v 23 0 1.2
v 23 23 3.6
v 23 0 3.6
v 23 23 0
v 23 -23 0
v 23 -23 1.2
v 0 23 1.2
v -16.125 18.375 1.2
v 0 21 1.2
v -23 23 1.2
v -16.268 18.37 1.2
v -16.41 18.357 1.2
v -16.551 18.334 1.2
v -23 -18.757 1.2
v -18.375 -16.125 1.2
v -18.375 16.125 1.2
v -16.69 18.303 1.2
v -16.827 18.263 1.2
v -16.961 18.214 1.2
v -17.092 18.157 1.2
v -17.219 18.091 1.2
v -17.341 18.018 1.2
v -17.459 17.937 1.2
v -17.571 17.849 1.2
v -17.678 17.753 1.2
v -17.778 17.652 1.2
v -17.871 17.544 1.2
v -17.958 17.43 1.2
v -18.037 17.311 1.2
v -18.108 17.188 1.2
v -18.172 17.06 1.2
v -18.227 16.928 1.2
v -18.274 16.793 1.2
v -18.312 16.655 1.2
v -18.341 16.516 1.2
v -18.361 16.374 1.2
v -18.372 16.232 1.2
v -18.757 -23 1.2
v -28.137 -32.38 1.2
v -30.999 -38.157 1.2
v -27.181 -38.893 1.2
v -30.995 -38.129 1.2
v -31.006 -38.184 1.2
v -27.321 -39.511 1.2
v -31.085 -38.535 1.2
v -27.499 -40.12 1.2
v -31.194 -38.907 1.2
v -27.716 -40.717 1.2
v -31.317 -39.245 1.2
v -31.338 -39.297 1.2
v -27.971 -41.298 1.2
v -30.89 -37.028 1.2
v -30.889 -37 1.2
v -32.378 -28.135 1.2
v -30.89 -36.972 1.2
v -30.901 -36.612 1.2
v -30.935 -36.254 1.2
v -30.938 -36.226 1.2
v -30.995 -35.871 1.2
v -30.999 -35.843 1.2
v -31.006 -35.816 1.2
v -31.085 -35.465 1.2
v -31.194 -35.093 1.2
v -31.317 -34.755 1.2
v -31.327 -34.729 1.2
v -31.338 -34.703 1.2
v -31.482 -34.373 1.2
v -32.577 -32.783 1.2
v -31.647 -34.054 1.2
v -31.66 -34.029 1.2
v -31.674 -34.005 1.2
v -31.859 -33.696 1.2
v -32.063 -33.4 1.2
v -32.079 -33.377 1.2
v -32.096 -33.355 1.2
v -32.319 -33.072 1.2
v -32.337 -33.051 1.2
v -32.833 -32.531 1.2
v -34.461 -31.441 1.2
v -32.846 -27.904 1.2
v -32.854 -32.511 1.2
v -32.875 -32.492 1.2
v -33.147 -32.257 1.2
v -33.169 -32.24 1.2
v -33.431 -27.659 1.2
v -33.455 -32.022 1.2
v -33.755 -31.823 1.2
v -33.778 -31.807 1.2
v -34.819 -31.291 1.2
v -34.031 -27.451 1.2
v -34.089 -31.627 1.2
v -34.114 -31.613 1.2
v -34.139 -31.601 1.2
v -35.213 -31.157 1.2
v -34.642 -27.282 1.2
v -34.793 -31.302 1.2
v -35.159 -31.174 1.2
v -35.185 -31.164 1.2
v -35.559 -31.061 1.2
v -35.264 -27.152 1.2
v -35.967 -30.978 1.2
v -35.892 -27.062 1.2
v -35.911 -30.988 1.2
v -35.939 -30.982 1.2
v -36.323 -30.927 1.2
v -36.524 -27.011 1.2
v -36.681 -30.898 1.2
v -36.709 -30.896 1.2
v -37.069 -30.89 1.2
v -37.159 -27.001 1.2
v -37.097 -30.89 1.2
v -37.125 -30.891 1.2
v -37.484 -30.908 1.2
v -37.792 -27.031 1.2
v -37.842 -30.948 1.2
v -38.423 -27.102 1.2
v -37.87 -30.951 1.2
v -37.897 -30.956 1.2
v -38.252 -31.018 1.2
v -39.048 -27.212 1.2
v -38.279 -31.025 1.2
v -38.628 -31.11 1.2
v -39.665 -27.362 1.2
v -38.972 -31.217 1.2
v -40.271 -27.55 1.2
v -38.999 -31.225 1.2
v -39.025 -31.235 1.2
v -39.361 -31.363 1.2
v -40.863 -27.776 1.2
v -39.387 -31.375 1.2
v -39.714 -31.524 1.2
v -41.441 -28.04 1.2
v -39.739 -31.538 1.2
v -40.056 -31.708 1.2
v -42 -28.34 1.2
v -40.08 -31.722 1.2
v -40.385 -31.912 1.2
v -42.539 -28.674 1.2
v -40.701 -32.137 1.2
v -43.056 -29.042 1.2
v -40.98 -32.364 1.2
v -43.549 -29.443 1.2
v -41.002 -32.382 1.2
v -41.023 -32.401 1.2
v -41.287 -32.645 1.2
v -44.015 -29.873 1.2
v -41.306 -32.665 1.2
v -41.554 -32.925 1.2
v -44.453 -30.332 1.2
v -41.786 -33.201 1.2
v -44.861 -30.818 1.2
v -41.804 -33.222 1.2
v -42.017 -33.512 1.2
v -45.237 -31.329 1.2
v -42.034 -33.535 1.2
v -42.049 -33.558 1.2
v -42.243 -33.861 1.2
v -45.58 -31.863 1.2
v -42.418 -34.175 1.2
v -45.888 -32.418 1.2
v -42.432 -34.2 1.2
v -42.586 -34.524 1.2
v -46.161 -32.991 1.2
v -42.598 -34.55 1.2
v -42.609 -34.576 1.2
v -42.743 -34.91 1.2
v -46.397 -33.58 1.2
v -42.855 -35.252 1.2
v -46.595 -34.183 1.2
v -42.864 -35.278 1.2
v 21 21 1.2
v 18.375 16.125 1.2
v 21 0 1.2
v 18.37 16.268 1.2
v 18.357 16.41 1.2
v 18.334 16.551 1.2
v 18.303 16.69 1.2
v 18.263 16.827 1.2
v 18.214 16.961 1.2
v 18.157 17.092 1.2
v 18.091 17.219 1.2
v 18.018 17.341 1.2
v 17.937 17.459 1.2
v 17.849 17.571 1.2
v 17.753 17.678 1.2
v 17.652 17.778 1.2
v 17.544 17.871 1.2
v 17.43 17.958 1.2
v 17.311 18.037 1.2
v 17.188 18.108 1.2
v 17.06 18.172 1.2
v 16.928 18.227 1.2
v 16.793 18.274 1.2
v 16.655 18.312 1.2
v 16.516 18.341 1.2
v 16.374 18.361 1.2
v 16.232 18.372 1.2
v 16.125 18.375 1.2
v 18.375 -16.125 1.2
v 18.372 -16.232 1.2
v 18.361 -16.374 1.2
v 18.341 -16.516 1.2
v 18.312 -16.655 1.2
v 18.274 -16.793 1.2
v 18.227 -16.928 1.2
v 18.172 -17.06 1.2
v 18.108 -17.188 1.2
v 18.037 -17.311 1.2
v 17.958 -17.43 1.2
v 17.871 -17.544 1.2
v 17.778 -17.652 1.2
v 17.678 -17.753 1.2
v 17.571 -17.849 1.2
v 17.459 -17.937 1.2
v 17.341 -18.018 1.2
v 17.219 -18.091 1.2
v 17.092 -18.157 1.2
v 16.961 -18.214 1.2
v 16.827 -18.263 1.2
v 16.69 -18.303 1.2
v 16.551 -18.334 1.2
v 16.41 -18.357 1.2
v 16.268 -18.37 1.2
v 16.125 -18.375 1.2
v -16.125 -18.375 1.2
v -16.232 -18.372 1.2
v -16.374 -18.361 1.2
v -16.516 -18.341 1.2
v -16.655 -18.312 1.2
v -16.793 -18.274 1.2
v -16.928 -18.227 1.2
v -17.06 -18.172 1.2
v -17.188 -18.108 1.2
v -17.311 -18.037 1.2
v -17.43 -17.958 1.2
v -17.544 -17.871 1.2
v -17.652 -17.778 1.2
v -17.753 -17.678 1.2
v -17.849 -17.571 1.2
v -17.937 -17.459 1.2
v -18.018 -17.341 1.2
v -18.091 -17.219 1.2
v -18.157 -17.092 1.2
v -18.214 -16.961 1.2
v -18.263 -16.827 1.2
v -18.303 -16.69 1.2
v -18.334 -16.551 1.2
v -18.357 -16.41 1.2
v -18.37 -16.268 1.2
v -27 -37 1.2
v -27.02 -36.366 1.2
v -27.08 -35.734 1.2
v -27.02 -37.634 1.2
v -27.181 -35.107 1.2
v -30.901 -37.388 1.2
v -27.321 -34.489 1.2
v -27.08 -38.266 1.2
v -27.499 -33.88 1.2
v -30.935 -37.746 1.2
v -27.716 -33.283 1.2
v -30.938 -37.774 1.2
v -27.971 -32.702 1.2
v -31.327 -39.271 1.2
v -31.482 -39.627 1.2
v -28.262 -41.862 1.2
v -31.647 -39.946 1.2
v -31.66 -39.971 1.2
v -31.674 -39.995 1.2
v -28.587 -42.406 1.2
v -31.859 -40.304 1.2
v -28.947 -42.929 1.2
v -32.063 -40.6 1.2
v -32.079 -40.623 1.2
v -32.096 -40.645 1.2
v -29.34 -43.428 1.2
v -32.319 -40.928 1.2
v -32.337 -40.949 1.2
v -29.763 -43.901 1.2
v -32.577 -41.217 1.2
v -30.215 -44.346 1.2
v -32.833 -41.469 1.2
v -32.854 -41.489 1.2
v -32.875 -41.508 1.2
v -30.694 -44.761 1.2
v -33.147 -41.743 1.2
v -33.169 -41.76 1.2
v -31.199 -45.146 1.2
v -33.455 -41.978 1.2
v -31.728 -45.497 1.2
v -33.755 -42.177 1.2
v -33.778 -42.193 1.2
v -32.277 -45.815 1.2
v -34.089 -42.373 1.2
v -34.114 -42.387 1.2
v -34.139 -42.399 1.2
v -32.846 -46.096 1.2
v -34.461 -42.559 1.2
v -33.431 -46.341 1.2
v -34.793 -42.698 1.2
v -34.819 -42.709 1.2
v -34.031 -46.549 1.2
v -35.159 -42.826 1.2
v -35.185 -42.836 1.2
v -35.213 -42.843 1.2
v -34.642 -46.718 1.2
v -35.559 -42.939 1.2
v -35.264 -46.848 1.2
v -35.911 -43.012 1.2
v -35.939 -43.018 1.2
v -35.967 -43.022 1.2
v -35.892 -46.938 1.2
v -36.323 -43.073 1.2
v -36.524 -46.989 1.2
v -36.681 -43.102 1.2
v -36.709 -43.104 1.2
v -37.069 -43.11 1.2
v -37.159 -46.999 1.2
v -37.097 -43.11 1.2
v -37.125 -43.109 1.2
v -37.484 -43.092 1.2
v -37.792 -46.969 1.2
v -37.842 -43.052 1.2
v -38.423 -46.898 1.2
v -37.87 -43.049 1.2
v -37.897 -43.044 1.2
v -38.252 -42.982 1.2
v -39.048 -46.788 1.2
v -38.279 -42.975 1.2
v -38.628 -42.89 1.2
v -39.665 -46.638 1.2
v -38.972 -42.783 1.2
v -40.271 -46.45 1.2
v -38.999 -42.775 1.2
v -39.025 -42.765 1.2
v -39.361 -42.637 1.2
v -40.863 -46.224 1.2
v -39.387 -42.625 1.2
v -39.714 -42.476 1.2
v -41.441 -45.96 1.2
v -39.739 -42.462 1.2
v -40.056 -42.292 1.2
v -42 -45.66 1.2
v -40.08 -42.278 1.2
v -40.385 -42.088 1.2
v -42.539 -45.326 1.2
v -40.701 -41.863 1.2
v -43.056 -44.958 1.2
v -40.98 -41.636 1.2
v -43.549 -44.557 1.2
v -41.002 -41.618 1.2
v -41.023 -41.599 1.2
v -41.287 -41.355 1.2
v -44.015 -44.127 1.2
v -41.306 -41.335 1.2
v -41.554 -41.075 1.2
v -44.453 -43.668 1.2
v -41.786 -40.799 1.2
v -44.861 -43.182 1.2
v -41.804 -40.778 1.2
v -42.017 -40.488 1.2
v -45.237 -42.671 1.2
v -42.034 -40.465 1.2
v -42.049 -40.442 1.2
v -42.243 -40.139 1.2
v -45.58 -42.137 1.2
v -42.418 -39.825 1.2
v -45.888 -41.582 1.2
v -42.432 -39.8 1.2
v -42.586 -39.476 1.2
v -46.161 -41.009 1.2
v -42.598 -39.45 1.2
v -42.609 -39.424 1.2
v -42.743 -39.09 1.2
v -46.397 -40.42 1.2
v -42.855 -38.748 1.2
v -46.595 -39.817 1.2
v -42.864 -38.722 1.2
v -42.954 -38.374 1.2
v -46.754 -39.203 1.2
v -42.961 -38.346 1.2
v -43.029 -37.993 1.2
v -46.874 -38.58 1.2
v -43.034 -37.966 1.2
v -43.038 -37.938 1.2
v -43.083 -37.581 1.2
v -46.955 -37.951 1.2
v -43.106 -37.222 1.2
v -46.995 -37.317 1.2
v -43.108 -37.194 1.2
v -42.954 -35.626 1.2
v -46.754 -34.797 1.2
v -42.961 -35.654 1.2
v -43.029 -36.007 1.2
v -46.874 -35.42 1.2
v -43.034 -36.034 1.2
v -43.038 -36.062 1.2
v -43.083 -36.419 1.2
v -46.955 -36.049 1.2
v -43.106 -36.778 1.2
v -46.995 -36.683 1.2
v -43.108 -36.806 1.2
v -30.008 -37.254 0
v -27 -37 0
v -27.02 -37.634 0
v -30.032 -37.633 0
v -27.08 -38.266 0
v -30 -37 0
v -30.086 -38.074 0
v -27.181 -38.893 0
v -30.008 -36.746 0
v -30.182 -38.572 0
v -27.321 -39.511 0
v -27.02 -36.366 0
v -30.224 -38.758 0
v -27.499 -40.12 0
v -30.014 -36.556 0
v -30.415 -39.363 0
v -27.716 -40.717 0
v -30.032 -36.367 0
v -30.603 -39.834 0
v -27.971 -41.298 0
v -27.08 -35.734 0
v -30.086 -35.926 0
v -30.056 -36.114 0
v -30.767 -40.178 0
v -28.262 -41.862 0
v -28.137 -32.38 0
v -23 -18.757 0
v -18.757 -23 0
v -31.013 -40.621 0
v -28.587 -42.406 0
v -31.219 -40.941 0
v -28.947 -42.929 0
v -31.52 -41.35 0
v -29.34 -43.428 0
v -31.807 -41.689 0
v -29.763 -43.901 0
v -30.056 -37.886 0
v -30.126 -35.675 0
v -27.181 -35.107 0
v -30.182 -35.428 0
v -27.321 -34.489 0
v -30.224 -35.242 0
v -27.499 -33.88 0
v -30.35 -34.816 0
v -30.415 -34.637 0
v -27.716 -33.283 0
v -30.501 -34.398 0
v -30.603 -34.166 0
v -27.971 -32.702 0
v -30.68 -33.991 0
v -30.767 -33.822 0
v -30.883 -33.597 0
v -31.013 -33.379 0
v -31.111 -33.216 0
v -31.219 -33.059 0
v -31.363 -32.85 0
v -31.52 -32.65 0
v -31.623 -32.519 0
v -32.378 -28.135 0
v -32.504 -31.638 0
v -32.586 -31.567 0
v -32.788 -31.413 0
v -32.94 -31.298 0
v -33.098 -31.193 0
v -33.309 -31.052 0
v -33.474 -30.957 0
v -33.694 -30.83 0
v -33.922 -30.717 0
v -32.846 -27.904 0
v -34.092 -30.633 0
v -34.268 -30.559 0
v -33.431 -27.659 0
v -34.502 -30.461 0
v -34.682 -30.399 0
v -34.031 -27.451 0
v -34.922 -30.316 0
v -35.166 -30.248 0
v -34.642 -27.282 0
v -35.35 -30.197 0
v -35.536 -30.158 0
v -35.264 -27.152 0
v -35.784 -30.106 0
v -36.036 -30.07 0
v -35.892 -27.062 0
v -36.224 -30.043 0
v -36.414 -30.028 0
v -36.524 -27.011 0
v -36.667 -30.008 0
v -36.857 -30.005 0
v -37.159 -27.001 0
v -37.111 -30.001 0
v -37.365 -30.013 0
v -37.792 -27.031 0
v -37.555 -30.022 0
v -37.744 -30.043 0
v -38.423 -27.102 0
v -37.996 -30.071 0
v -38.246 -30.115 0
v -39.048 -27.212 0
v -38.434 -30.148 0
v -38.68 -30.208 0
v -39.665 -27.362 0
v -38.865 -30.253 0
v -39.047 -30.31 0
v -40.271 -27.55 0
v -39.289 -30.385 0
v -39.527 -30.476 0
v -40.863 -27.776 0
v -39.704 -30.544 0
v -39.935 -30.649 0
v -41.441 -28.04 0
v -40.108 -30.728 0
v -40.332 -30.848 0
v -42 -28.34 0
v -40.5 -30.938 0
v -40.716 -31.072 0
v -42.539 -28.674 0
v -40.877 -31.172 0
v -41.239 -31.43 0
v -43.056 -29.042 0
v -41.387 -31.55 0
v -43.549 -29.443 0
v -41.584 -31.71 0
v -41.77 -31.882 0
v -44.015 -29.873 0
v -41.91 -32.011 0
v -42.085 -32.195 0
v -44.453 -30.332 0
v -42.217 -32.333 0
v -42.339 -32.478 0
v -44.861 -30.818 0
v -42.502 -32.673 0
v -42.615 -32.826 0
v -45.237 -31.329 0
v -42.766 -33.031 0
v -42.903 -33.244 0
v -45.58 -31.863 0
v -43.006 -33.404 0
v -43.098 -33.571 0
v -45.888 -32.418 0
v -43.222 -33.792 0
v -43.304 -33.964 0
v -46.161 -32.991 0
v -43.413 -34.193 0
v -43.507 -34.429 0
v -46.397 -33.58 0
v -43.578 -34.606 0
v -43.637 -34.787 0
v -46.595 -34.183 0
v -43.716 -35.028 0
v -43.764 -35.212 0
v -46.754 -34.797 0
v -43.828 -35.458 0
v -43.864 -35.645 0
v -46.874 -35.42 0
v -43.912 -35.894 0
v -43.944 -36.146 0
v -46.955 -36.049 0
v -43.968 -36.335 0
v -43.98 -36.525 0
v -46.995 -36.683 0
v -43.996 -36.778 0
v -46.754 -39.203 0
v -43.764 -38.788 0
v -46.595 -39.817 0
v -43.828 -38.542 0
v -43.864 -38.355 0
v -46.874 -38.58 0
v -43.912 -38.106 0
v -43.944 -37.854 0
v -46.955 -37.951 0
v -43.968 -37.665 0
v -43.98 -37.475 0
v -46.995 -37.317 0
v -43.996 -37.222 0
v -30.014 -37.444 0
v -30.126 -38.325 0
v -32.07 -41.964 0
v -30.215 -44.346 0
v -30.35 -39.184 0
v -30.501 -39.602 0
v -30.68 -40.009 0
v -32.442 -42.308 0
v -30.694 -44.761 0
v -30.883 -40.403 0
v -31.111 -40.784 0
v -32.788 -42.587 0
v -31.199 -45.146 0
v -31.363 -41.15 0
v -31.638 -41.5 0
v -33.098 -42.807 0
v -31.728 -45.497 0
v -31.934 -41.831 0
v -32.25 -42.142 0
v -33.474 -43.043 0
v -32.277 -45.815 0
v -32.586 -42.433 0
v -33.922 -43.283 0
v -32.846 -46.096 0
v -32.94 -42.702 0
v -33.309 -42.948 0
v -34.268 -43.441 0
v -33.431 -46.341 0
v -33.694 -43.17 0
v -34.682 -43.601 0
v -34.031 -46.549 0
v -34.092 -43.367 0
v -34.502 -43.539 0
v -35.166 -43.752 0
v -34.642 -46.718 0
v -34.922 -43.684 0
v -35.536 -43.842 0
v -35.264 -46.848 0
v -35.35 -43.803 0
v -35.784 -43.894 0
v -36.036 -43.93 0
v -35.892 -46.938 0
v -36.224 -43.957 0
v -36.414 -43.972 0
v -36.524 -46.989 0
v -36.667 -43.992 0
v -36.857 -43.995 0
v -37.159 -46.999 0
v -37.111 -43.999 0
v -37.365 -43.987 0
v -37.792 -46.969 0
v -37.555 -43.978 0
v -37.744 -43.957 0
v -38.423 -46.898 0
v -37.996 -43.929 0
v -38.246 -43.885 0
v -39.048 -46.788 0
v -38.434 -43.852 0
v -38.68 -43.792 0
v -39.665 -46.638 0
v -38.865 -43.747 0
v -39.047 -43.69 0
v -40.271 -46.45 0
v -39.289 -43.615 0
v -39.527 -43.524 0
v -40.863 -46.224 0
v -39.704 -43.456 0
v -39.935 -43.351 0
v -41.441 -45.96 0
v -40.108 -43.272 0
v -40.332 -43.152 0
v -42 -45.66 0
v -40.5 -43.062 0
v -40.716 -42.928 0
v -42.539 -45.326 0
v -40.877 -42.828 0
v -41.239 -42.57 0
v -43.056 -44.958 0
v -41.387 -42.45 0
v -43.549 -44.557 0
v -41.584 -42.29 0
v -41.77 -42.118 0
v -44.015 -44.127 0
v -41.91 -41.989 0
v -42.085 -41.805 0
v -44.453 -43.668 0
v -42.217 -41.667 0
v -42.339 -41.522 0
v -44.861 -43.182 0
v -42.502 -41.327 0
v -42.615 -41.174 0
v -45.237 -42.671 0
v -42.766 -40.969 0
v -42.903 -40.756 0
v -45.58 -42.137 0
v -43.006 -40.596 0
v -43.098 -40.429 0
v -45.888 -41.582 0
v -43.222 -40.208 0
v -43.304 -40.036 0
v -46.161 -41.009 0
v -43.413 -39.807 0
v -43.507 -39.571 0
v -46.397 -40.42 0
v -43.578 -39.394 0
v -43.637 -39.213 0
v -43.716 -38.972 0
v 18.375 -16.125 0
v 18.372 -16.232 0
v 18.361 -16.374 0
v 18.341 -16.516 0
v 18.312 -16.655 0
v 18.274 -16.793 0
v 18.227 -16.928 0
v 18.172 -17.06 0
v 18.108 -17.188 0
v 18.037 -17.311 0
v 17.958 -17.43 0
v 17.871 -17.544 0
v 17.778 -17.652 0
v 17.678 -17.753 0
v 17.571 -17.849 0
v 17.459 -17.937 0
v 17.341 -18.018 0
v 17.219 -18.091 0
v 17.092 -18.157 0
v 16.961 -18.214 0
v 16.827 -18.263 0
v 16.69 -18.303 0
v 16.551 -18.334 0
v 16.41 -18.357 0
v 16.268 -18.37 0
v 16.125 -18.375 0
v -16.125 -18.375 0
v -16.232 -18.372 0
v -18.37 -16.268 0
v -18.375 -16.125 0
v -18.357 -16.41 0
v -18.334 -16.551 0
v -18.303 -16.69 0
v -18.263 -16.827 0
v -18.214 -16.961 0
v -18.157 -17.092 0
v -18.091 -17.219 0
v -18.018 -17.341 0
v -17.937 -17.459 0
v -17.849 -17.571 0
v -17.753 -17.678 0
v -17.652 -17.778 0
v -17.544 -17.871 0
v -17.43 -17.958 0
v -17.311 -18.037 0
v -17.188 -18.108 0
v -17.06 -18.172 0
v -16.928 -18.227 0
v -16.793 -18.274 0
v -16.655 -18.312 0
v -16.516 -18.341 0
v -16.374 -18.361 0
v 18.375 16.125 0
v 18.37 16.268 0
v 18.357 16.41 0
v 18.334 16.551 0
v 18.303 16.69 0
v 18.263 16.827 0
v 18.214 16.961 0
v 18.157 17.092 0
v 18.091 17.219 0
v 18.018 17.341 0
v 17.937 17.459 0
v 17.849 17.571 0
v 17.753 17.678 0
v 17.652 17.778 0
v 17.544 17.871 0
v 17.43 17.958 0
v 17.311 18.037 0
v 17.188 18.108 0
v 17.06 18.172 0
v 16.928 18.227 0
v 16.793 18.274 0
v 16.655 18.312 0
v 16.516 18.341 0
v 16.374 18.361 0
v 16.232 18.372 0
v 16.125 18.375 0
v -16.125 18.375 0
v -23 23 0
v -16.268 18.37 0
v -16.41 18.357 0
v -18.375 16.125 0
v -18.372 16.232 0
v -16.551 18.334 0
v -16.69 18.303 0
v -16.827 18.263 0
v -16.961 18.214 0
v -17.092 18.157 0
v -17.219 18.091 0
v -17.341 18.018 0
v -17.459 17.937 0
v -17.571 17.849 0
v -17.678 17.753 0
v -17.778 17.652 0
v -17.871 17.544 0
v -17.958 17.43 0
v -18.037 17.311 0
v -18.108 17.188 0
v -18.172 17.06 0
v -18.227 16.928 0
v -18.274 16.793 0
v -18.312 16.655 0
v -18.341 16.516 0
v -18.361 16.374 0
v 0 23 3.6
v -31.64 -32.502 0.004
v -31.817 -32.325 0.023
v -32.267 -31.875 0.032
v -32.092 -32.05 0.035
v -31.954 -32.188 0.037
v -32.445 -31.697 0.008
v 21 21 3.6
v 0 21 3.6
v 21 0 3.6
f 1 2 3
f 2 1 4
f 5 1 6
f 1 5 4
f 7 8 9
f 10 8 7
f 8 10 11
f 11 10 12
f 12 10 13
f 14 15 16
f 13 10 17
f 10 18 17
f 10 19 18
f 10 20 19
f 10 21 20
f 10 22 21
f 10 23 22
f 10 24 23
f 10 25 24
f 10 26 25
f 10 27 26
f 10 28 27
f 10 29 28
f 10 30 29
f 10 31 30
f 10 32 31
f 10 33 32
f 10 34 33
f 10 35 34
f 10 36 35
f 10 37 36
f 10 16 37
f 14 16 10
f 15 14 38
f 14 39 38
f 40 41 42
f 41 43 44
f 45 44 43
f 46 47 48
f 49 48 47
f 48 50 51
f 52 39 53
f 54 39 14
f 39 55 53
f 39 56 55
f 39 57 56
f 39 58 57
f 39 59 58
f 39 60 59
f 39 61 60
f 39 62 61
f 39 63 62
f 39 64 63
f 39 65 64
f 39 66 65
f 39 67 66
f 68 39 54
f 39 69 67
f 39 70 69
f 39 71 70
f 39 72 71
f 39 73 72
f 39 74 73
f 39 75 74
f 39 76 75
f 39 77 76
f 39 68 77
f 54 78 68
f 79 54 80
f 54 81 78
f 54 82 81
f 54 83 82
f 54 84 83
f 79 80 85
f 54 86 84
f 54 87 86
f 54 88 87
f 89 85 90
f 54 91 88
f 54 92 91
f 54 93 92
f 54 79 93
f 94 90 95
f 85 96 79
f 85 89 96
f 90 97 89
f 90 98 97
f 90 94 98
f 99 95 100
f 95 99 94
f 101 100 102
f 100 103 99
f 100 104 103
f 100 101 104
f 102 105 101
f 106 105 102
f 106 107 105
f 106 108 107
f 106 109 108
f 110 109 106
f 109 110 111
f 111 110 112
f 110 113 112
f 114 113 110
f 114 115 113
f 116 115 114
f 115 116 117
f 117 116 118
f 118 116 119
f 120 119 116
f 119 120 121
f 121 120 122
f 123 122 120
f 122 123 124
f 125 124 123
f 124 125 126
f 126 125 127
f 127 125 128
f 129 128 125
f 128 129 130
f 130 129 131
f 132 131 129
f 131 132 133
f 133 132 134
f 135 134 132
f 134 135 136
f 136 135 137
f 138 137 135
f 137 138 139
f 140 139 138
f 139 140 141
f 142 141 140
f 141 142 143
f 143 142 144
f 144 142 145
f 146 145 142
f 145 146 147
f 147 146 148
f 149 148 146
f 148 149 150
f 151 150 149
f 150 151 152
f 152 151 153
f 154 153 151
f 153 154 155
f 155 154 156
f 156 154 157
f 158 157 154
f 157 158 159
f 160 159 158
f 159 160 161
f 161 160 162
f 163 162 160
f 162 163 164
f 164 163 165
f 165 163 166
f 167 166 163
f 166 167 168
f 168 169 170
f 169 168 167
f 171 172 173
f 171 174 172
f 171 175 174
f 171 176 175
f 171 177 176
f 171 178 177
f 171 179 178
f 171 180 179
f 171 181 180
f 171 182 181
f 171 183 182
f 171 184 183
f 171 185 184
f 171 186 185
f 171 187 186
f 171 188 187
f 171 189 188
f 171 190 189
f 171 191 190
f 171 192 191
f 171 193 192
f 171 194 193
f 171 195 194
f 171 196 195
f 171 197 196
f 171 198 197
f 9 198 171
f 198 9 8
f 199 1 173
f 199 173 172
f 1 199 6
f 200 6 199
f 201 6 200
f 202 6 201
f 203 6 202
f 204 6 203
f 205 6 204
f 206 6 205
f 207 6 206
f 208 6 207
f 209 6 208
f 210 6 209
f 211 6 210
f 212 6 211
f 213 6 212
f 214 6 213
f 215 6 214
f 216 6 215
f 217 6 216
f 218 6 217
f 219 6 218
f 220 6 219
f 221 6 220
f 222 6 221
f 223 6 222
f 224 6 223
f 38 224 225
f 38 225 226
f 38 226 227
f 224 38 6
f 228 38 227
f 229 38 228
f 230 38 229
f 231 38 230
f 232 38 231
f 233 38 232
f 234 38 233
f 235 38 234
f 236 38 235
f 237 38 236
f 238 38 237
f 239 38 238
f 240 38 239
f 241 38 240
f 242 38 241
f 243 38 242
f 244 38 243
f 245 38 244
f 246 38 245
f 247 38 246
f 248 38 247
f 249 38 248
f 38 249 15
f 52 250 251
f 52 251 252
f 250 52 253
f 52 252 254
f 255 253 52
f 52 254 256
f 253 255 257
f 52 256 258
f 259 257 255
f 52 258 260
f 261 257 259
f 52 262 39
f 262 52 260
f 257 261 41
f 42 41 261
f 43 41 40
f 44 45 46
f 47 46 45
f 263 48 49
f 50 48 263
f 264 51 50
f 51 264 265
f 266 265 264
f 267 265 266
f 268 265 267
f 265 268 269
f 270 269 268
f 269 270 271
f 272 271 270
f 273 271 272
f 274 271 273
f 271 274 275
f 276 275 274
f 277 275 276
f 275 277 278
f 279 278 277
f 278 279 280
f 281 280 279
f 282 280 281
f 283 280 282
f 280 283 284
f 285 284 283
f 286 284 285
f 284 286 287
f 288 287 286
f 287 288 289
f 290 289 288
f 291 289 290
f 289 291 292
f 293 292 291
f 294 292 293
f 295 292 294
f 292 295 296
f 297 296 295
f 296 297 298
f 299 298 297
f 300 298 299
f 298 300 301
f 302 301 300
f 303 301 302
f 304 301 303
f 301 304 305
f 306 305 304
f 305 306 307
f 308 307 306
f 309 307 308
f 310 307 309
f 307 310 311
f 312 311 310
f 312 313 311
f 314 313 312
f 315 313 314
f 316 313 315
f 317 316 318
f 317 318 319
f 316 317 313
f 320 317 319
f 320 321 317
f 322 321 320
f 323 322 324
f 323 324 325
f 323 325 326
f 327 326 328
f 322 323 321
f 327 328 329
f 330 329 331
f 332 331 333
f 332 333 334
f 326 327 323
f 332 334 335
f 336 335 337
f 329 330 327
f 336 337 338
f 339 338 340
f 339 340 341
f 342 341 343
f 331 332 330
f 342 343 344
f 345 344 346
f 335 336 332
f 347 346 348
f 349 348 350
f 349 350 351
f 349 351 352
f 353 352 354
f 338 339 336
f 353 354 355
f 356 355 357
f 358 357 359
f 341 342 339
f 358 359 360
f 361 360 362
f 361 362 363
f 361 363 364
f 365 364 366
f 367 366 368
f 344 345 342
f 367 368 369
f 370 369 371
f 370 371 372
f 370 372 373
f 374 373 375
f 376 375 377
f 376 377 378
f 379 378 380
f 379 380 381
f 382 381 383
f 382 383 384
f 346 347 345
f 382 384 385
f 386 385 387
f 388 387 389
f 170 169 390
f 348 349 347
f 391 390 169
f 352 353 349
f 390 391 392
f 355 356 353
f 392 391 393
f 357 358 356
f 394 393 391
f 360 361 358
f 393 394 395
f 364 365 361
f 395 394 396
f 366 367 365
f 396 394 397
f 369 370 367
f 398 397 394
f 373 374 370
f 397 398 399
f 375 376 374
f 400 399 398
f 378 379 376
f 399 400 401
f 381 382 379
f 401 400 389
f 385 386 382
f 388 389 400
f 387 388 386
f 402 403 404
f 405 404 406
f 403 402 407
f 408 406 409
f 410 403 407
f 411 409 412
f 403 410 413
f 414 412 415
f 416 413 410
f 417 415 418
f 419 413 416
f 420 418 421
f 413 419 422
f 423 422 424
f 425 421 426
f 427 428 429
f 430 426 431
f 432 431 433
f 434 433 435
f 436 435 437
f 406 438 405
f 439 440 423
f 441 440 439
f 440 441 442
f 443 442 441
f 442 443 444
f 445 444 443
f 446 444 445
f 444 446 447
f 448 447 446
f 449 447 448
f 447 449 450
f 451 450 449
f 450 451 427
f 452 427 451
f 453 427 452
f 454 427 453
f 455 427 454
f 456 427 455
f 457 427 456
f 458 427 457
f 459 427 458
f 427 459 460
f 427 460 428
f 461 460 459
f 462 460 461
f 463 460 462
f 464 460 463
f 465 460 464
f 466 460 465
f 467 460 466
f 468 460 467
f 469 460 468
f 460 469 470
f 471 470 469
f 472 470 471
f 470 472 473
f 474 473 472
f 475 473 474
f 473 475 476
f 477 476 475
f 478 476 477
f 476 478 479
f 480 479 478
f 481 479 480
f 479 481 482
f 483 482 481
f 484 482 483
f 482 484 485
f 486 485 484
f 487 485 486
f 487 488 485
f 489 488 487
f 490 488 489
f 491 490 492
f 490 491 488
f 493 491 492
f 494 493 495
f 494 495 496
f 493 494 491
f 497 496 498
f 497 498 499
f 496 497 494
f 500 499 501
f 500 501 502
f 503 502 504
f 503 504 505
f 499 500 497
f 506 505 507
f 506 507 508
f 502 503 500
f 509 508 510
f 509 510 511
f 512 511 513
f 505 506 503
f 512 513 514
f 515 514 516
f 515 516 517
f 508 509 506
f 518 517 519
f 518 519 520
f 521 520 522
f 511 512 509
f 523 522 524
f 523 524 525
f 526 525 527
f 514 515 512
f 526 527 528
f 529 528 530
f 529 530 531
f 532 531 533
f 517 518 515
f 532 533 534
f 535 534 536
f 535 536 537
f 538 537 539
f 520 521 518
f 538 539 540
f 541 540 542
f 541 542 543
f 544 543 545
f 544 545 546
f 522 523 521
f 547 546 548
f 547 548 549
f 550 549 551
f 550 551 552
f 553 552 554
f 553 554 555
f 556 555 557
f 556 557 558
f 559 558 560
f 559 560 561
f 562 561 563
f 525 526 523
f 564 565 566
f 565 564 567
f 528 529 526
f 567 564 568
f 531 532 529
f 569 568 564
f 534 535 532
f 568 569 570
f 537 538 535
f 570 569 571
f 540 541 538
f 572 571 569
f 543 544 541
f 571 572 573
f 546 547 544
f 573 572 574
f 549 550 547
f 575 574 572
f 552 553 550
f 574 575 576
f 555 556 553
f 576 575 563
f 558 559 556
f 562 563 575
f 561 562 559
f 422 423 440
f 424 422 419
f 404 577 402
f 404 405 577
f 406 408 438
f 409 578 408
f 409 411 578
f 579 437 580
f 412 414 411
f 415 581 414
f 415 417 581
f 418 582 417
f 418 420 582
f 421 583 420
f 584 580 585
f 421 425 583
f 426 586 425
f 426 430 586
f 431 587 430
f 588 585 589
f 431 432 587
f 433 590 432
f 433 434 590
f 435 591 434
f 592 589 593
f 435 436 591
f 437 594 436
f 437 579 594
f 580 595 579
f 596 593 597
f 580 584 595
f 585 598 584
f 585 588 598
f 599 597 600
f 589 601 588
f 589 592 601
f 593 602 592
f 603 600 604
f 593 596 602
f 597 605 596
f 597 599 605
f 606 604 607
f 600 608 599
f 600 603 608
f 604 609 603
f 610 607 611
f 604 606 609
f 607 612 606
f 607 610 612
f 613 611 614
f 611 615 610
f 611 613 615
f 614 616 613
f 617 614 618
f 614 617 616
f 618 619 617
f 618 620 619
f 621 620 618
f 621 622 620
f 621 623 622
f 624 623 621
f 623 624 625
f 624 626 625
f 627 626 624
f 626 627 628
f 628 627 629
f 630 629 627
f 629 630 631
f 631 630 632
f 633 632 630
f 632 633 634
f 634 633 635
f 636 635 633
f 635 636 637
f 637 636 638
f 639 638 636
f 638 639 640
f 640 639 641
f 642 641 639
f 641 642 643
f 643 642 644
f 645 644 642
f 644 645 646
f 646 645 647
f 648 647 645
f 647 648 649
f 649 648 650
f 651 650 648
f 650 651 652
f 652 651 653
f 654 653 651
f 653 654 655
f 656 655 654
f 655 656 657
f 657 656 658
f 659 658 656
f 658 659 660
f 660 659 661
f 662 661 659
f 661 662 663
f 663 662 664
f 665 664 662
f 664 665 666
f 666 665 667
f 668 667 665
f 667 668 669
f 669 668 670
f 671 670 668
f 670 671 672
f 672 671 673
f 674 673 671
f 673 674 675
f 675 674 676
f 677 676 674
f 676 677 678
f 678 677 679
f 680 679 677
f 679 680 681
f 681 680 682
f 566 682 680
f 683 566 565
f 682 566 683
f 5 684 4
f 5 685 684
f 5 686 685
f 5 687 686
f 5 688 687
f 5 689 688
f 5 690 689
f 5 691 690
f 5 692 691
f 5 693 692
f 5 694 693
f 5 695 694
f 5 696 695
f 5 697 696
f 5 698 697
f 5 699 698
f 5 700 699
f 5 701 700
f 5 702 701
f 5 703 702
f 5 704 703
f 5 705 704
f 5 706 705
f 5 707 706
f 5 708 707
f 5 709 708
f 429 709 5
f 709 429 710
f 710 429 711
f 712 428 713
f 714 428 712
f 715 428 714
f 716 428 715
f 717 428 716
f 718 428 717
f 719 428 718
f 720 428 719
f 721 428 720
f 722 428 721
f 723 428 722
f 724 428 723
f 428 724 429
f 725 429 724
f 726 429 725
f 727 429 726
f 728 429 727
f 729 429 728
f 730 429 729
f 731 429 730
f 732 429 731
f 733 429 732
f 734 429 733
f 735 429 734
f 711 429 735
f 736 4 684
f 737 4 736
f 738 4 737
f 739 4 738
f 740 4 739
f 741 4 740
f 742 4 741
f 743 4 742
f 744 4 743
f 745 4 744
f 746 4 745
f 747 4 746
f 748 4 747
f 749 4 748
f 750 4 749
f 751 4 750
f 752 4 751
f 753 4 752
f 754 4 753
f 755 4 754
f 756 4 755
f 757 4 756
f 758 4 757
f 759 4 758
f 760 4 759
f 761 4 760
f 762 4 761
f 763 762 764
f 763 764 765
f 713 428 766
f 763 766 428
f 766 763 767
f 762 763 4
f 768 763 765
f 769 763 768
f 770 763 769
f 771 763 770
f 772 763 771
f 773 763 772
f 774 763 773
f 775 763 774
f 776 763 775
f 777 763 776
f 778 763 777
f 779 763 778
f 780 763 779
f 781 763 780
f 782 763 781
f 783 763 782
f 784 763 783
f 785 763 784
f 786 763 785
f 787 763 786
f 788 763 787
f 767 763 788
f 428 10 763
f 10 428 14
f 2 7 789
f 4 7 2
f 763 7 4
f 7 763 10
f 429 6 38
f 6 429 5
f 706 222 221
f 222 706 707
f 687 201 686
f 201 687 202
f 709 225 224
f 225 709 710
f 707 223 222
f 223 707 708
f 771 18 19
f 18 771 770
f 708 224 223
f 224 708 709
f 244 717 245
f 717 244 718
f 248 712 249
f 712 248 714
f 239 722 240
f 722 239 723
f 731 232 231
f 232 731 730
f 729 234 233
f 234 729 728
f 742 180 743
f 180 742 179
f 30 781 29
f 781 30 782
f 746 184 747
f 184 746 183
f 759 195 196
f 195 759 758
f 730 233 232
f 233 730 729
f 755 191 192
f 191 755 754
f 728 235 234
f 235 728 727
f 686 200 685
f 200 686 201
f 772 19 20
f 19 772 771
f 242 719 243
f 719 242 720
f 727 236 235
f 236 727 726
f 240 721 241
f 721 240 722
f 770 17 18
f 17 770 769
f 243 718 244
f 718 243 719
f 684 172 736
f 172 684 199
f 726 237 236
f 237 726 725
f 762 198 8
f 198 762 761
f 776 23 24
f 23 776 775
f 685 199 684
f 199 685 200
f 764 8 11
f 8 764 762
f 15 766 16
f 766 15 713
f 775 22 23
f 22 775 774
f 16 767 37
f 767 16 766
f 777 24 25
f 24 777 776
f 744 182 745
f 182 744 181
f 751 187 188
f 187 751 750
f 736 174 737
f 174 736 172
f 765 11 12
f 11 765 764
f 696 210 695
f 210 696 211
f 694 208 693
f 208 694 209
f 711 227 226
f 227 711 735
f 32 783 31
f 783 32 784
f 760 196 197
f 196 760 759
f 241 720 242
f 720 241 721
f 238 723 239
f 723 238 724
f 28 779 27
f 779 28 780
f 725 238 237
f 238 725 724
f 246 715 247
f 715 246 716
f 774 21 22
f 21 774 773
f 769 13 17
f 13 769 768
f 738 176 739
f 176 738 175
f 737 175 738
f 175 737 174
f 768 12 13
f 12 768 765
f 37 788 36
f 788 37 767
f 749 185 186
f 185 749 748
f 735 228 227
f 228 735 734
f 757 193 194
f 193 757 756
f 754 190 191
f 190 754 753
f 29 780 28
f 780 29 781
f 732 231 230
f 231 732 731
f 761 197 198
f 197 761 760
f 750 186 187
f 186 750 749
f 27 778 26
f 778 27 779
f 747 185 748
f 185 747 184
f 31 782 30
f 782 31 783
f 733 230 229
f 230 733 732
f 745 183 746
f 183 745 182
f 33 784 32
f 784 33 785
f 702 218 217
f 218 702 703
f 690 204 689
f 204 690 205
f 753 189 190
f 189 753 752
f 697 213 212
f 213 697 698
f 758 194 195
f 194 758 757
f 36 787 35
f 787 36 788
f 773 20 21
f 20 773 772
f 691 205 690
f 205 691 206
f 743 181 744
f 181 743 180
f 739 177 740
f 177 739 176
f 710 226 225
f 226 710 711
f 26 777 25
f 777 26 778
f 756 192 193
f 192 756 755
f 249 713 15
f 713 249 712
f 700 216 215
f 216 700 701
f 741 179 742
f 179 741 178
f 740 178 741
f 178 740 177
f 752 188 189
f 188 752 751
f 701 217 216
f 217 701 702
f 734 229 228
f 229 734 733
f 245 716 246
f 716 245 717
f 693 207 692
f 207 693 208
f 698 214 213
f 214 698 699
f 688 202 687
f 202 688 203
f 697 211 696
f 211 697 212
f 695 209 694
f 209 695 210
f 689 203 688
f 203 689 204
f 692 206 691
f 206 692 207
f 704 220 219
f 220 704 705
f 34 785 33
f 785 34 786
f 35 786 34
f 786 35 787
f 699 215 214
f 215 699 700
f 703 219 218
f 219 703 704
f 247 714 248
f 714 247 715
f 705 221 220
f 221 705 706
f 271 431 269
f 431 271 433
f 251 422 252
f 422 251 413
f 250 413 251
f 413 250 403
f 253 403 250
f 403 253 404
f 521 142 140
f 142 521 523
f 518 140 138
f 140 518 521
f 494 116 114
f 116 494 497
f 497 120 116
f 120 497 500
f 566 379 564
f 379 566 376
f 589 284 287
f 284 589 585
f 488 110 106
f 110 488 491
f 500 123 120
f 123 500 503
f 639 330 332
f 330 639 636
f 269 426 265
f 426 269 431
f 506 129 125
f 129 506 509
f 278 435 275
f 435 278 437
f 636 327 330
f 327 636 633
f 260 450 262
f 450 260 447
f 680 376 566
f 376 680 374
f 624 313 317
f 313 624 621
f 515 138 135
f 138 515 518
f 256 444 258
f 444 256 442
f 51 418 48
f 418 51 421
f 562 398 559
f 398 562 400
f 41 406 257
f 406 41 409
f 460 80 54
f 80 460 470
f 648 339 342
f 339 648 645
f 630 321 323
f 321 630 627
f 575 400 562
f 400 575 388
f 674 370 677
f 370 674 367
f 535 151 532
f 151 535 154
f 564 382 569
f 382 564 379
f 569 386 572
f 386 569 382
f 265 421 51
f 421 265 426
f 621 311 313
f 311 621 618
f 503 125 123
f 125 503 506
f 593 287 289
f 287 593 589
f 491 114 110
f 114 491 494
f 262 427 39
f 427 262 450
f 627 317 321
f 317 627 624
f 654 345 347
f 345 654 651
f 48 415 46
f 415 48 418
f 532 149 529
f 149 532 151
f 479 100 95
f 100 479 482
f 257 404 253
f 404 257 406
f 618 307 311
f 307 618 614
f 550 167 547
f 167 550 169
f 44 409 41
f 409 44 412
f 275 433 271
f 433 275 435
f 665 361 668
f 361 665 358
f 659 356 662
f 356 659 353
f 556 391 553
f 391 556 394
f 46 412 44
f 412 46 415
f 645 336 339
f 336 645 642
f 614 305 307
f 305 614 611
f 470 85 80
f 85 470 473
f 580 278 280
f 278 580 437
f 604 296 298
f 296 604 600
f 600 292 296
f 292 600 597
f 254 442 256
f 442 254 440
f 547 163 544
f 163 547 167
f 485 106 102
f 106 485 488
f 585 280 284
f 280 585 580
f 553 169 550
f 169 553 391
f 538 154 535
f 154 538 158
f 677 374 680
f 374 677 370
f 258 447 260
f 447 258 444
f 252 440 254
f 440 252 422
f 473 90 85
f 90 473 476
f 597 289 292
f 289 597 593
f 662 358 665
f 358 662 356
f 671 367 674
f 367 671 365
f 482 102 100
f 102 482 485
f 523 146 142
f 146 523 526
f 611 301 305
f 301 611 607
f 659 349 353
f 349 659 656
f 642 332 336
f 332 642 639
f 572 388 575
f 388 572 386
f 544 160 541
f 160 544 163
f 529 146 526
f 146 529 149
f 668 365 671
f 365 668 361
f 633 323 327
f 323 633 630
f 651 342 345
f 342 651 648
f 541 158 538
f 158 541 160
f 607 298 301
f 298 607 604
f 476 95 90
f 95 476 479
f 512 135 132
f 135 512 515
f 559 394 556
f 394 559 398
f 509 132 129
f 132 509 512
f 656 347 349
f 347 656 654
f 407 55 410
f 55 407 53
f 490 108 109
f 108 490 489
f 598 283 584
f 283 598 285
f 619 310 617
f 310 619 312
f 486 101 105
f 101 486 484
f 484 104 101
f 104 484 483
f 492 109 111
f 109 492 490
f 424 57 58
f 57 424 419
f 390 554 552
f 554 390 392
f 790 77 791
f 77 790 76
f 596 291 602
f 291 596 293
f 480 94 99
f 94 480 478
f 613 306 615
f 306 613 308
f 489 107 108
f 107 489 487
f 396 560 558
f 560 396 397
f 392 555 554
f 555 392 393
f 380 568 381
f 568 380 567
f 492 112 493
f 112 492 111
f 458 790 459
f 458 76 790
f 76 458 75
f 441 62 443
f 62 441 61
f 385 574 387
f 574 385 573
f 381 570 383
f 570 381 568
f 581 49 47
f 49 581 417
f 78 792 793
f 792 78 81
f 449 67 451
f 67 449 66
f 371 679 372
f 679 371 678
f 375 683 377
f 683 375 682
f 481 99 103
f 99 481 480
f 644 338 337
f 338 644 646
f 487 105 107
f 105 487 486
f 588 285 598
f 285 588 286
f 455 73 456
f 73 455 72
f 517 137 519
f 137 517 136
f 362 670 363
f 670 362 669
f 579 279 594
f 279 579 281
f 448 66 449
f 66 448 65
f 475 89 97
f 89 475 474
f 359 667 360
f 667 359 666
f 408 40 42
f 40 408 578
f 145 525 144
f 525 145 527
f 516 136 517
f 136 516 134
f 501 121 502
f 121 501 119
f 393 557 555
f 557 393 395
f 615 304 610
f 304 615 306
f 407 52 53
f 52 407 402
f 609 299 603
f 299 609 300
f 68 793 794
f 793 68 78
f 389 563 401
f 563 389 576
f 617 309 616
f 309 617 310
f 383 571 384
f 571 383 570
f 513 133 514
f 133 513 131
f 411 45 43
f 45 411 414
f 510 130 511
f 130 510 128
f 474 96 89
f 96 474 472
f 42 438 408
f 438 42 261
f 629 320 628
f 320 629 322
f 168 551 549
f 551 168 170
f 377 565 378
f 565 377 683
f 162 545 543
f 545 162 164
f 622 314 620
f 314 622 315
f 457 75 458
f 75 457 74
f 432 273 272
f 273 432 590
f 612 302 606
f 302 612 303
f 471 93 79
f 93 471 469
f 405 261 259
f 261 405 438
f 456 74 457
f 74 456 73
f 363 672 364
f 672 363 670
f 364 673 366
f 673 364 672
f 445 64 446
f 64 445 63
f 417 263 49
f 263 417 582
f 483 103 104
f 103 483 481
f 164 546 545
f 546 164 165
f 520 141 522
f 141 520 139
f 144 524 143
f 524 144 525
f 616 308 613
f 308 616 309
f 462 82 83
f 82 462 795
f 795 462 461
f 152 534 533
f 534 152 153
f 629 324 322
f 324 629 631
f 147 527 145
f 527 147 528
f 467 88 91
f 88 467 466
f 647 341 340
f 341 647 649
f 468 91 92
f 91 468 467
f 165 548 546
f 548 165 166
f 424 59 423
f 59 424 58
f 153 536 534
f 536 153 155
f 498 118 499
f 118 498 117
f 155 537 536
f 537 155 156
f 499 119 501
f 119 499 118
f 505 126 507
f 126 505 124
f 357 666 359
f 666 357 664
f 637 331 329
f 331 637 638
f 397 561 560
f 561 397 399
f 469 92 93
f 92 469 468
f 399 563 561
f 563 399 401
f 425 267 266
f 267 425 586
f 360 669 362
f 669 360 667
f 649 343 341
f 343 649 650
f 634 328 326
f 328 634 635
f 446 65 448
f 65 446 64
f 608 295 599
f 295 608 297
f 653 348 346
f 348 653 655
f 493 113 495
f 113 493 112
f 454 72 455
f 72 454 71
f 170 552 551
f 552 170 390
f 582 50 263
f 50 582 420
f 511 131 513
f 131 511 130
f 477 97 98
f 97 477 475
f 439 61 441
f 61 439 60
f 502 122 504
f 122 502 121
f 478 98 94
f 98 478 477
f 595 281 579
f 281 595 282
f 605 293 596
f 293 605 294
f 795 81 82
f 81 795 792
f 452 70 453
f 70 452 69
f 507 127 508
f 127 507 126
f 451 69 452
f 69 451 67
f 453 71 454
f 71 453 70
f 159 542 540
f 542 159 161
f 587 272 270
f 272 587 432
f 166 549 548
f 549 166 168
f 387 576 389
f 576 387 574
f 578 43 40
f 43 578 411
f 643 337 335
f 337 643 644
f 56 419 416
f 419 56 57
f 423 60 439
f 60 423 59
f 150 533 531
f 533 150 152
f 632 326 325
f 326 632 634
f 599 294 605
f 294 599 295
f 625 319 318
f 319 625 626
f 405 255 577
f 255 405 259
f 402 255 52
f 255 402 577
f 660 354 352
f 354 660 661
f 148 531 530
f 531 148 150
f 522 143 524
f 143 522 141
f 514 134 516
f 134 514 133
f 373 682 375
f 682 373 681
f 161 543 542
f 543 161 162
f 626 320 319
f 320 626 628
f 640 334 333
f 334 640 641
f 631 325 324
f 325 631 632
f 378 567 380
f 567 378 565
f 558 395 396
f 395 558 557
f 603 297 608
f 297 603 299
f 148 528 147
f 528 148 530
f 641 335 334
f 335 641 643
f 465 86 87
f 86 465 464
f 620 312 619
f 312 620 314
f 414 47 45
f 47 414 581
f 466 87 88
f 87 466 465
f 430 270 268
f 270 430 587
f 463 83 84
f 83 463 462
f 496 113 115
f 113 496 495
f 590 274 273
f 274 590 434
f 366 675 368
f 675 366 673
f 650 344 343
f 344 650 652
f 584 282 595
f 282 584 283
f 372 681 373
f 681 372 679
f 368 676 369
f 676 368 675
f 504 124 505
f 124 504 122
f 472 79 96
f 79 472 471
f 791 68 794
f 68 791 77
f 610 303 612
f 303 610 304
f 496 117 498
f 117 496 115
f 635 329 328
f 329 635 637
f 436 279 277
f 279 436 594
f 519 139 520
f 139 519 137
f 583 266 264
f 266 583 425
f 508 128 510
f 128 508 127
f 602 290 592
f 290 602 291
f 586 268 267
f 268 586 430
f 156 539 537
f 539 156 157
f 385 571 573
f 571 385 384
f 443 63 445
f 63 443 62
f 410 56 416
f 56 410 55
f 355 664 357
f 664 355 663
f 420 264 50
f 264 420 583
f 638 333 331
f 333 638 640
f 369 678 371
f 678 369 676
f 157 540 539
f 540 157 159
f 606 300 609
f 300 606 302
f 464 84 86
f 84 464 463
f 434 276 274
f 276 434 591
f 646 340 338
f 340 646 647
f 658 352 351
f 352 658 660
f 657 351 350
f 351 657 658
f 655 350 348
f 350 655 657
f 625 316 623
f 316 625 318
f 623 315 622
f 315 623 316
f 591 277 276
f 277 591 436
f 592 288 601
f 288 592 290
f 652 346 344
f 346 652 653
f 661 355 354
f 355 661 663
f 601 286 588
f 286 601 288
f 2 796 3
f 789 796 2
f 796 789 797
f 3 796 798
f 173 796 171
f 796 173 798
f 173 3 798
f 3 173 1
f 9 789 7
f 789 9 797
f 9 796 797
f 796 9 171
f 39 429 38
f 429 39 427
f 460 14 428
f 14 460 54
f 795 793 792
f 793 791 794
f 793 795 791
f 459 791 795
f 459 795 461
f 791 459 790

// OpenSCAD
//====================================================================
// MainStage1.scad
//
// MainStage logo for coins or disks
// 
//====================================================================


use <./mainstageGold.scad>

layer = 0.3;
thick = 7*layer;    // thickness not including top and bottom

mag=32;   // scaling
R0=2;     // rounding of corners

//------------------------------------------------------------
module Main1gold(){
  
    intersection(){
      translate([0,0,0])
      scale([mag,mag,10])
      mainstageGold();
      
      linear_extrude(height=thick)
      offset(r=R0)
      square([mag,mag],center=true);
  }
}

//------------------------------------------------------------
module Main1black(){
  
  difference(){
      linear_extrude(height=thick)
      offset(r=R0,$fn=99)
      square([mag,mag],center=true);
    
      translate([0,0,-1])
      scale([mag,mag,10])
      mainstageGold();
  
  }

}
//------------------------------------------------------------
module Main1top(){
  
  translate([0,0,thick])
  linear_extrude(height=layer)
  offset(r=R0,$fn=99)
  square([mag,mag],center=true);
    

}
//------------------------------------------------------------
module Main1bottom(){
  
  translate([0,0,-layer])
  linear_extrude(height=layer)
  offset(r=R0,$fn=99)
  square([mag,mag],center=true);
    

}

//-------------------------------------------------------------
module Main1sand(){
tol=0.25;
  
  // main boss
  difference(){
    translate([0,0,2*layer])
    cube([mag+14,mag+14,4*layer],center=true);
    
    // cut for part
    translate([0,0,-0.5*layer])
    linear_extrude(height=5*layer)
    offset(r=R0+tol,$fn=99)
    square([mag+tol,mag+tol],center=true);    

  }
  
  // corners to hang over glass
  translate([0.5*(mag+14)-2,0,4*layer])
  cube([2,23,8*layer]);
  
  translate([0,0.5*(mag+14)-2,4*layer])
  cube([23,2,8*layer]);

  translate([-0.5*(mag+18),-0.5*(mag+18),2*layer])
  rotate([0,0,-45])
  cube([6,20,4*layer],center=true);
      
  difference(){
    translate([-0.5*(mag+42),-0.5*(mag+42),0])    
    cylinder(r=10,h=4*layer,$fn=99);

    // finger grip
    translate([-0.5*(mag+42),-0.5*(mag+42),0])    
    cylinder(r1=8,r2=6,h=9*layer,center=true,$fn=99);
  }
  
}


//===============================================================

//Main1gold();
//Main1black();
//Main1top();
//Main1bottom();

Main1sand();

//===============================================================
